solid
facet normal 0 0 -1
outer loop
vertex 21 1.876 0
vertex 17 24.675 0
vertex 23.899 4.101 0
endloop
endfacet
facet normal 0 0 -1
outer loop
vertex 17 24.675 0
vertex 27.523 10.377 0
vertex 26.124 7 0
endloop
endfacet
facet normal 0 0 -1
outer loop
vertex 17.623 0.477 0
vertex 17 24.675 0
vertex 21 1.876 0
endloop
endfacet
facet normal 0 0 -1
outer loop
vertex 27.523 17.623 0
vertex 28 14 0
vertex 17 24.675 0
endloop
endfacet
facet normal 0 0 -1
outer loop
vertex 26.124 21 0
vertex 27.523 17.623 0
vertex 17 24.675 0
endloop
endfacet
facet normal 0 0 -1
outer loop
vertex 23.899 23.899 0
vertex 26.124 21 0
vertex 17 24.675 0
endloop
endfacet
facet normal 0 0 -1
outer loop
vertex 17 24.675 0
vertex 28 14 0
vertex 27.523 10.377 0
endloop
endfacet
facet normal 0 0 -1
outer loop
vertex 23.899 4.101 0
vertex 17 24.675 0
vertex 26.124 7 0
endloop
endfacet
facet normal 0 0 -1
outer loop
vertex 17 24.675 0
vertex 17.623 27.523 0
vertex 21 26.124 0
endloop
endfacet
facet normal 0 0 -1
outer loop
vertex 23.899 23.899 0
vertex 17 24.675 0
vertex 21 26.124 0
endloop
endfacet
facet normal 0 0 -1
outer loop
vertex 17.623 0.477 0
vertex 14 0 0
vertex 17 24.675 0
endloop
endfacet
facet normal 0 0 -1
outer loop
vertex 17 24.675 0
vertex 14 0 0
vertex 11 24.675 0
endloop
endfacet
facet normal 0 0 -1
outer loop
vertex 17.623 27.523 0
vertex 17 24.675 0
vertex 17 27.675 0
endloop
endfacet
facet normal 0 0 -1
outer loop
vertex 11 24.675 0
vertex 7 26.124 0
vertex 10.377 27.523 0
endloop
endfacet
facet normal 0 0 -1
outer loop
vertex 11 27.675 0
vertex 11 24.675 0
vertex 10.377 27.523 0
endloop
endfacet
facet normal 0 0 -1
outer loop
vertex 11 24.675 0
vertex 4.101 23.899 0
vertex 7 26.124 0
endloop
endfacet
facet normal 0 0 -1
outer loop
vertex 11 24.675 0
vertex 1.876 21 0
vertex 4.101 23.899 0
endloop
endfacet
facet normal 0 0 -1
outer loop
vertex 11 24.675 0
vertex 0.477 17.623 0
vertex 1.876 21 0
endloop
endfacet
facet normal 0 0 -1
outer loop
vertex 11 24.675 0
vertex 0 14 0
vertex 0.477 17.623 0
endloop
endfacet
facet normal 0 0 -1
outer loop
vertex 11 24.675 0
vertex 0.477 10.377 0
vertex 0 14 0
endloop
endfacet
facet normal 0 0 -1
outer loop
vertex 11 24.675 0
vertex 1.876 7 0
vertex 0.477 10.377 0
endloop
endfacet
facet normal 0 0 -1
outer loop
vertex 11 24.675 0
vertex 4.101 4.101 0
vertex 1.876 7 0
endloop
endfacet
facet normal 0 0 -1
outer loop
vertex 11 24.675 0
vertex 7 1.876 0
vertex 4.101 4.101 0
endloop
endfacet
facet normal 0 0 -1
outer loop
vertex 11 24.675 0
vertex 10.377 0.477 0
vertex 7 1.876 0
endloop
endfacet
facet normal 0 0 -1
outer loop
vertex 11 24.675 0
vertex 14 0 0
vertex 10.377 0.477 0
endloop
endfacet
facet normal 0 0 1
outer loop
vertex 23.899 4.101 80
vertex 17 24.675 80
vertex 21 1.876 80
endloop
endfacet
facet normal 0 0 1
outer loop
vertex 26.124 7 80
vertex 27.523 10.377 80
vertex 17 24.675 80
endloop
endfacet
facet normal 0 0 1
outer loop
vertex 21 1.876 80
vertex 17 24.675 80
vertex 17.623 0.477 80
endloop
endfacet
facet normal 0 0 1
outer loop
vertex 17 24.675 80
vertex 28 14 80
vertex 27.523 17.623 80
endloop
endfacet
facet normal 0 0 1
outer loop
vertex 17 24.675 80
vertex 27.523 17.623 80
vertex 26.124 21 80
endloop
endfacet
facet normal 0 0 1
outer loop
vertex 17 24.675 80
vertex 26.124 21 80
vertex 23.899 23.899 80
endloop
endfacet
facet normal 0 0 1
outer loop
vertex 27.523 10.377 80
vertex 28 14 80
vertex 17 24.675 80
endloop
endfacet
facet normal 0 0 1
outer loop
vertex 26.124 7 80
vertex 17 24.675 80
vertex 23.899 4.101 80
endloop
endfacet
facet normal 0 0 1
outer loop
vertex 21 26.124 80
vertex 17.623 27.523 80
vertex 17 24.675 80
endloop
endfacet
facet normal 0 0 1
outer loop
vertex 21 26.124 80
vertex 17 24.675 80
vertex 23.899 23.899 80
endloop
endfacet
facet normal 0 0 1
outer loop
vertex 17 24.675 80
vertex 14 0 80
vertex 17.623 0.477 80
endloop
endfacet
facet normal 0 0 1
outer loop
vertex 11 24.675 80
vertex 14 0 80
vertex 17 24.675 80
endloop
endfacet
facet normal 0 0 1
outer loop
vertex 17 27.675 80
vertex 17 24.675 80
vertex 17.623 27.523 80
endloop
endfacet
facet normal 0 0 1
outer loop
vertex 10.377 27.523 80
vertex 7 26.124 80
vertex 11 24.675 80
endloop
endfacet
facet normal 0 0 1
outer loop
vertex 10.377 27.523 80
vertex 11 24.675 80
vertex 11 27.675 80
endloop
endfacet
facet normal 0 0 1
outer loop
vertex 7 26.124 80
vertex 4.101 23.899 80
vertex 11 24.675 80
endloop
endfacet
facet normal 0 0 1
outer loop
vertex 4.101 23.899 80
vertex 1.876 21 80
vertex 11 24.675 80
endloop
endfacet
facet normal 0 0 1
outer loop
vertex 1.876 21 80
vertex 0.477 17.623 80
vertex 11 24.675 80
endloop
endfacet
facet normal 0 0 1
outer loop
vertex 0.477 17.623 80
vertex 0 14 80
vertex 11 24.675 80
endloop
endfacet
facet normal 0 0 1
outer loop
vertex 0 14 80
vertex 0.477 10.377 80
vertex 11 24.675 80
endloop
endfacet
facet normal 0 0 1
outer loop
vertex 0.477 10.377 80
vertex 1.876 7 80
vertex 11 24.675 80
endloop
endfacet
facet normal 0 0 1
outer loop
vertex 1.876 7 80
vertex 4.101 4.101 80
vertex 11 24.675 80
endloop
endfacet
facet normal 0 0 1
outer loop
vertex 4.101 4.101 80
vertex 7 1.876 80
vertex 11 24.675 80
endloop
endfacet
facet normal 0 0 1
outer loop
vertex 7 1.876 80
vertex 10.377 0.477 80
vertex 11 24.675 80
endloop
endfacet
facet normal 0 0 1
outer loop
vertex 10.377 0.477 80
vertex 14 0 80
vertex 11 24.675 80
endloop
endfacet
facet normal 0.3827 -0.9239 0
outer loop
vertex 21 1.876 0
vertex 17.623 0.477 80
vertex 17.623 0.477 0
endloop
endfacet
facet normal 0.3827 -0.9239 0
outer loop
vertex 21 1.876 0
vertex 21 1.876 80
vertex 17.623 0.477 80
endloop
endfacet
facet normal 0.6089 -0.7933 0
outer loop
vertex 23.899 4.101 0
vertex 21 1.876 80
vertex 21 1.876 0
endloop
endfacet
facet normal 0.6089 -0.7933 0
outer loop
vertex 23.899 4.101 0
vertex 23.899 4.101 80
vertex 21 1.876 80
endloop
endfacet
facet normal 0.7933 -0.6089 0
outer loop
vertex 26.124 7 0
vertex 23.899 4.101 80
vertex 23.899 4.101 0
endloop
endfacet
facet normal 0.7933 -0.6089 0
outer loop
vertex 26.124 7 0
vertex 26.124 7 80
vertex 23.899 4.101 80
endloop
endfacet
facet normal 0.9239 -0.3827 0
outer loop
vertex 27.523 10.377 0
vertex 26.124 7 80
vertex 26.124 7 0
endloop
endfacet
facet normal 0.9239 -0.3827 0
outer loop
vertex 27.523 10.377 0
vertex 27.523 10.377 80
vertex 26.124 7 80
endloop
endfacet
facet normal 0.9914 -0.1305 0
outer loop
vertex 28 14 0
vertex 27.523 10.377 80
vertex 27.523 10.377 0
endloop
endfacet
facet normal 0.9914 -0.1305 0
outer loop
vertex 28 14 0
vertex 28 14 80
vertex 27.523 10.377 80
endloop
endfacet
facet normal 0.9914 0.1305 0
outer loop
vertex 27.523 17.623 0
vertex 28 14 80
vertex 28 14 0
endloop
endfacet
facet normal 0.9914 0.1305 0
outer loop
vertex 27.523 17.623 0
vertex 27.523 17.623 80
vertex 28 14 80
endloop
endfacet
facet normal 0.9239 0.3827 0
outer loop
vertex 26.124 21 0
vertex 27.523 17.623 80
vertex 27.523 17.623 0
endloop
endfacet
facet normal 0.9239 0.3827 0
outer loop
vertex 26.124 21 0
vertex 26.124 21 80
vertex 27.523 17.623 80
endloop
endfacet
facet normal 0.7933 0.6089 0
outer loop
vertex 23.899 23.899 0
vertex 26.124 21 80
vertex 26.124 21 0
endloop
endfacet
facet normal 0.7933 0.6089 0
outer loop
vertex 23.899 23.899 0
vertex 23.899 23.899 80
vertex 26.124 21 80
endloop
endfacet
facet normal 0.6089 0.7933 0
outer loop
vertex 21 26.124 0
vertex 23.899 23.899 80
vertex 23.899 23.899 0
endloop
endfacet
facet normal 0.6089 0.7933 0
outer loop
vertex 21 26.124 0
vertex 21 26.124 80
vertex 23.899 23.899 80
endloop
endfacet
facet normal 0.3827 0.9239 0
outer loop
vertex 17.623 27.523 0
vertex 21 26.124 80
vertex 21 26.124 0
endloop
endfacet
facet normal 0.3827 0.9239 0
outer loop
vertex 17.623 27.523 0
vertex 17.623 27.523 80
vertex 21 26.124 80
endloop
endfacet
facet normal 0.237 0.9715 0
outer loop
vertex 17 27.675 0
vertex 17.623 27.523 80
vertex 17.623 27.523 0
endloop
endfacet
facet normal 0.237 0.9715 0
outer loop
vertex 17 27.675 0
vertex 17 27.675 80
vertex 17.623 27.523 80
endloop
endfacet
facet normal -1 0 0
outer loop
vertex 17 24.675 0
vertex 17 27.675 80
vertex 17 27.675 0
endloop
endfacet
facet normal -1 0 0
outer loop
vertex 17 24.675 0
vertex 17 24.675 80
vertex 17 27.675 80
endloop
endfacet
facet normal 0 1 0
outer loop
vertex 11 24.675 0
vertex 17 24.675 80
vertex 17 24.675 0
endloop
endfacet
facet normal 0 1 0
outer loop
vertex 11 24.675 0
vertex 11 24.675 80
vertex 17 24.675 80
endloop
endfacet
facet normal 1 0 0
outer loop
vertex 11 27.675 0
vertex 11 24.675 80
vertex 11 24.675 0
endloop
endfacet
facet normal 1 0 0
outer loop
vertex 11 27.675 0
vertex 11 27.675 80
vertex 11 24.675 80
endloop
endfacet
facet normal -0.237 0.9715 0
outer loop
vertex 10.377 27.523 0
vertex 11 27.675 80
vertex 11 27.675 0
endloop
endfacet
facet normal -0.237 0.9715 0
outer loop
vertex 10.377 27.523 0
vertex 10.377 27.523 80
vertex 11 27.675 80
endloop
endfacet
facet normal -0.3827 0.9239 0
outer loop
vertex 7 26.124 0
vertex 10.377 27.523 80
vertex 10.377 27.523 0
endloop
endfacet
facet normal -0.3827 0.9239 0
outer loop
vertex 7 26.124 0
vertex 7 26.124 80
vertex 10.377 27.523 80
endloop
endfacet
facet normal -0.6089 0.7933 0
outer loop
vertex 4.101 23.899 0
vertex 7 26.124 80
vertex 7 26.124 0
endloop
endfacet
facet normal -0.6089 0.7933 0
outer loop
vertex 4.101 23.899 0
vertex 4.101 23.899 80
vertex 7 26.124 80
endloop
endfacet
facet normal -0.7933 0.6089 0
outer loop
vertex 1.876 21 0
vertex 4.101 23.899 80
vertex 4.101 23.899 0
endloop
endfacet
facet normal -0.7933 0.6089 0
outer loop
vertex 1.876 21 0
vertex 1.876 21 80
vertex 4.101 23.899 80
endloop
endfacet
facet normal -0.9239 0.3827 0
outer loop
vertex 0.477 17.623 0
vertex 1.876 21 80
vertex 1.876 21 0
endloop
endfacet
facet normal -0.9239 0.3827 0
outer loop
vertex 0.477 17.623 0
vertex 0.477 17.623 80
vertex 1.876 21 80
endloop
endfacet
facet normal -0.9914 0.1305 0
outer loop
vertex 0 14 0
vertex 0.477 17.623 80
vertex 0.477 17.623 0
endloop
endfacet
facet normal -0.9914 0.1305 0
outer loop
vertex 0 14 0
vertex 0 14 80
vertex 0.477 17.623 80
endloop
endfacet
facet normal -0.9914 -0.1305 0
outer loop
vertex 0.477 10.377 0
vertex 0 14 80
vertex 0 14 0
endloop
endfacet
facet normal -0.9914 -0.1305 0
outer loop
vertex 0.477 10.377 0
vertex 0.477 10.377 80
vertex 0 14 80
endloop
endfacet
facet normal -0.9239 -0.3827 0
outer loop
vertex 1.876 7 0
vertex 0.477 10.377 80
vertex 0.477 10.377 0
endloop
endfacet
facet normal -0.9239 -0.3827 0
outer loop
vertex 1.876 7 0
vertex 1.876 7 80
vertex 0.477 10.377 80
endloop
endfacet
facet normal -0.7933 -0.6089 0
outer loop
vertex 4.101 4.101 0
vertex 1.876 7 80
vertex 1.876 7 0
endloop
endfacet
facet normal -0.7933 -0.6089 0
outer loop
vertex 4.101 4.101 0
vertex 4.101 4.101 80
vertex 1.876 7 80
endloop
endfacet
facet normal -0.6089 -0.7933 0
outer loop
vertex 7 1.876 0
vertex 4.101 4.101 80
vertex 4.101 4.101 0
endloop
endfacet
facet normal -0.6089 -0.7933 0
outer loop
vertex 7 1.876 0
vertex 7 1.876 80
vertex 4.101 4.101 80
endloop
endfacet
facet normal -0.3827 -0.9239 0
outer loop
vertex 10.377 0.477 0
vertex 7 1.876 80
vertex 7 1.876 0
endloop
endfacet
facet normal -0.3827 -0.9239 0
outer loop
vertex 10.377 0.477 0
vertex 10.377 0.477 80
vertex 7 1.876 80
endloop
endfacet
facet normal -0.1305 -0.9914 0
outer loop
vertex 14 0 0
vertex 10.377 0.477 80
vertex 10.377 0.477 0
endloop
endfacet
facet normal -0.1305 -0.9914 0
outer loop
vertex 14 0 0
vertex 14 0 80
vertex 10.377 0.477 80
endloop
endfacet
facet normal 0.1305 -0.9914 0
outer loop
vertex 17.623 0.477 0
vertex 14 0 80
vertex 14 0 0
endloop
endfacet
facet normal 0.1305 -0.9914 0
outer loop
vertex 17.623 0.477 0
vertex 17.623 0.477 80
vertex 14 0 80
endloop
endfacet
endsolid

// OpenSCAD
$fn = 32;

// ----------------------------------------------------------------------
// Keyway shaft: d28 shaft, key 6 x 3 mm
// ----------------------------------------------------------------------

// --- parameters (mm) ---
shaft_r = 14;             // shaft radius
key_w = 6;                // keyway width
key_d = 3;                // keyway depth below the surface line
plate_t = 80;             // shaft length, Z (extrusion height)

shaft_d = 2 * shaft_r;  // shaft diameter
circle_step = 15;  // polygon sampling step, degrees

profile = [[10.377, 27.523], [7, 26.124], [4.101, 23.899], [1.876, 21], [0.477, 17.623], [0, 14], [0.477, 10.377], [1.876, 7], [4.101, 4.101], [7, 1.876], [10.377, 0.477], [14, 0], [17.623, 0.477], [21, 1.876], [23.899, 4.101], [26.124, 7], [27.523, 10.377], [28, 14], [27.523, 17.623], [26.124, 21], [23.899, 23.899], [21, 26.124], [17.623, 27.523], [17, 27.675], [17, 24.675], [11, 24.675], [11, 27.675]];  // primary outline, 27 points, counter clockwise

// --- the one profile operation ---
linear_extrude(height = plate_t) polygon(points = profile);
